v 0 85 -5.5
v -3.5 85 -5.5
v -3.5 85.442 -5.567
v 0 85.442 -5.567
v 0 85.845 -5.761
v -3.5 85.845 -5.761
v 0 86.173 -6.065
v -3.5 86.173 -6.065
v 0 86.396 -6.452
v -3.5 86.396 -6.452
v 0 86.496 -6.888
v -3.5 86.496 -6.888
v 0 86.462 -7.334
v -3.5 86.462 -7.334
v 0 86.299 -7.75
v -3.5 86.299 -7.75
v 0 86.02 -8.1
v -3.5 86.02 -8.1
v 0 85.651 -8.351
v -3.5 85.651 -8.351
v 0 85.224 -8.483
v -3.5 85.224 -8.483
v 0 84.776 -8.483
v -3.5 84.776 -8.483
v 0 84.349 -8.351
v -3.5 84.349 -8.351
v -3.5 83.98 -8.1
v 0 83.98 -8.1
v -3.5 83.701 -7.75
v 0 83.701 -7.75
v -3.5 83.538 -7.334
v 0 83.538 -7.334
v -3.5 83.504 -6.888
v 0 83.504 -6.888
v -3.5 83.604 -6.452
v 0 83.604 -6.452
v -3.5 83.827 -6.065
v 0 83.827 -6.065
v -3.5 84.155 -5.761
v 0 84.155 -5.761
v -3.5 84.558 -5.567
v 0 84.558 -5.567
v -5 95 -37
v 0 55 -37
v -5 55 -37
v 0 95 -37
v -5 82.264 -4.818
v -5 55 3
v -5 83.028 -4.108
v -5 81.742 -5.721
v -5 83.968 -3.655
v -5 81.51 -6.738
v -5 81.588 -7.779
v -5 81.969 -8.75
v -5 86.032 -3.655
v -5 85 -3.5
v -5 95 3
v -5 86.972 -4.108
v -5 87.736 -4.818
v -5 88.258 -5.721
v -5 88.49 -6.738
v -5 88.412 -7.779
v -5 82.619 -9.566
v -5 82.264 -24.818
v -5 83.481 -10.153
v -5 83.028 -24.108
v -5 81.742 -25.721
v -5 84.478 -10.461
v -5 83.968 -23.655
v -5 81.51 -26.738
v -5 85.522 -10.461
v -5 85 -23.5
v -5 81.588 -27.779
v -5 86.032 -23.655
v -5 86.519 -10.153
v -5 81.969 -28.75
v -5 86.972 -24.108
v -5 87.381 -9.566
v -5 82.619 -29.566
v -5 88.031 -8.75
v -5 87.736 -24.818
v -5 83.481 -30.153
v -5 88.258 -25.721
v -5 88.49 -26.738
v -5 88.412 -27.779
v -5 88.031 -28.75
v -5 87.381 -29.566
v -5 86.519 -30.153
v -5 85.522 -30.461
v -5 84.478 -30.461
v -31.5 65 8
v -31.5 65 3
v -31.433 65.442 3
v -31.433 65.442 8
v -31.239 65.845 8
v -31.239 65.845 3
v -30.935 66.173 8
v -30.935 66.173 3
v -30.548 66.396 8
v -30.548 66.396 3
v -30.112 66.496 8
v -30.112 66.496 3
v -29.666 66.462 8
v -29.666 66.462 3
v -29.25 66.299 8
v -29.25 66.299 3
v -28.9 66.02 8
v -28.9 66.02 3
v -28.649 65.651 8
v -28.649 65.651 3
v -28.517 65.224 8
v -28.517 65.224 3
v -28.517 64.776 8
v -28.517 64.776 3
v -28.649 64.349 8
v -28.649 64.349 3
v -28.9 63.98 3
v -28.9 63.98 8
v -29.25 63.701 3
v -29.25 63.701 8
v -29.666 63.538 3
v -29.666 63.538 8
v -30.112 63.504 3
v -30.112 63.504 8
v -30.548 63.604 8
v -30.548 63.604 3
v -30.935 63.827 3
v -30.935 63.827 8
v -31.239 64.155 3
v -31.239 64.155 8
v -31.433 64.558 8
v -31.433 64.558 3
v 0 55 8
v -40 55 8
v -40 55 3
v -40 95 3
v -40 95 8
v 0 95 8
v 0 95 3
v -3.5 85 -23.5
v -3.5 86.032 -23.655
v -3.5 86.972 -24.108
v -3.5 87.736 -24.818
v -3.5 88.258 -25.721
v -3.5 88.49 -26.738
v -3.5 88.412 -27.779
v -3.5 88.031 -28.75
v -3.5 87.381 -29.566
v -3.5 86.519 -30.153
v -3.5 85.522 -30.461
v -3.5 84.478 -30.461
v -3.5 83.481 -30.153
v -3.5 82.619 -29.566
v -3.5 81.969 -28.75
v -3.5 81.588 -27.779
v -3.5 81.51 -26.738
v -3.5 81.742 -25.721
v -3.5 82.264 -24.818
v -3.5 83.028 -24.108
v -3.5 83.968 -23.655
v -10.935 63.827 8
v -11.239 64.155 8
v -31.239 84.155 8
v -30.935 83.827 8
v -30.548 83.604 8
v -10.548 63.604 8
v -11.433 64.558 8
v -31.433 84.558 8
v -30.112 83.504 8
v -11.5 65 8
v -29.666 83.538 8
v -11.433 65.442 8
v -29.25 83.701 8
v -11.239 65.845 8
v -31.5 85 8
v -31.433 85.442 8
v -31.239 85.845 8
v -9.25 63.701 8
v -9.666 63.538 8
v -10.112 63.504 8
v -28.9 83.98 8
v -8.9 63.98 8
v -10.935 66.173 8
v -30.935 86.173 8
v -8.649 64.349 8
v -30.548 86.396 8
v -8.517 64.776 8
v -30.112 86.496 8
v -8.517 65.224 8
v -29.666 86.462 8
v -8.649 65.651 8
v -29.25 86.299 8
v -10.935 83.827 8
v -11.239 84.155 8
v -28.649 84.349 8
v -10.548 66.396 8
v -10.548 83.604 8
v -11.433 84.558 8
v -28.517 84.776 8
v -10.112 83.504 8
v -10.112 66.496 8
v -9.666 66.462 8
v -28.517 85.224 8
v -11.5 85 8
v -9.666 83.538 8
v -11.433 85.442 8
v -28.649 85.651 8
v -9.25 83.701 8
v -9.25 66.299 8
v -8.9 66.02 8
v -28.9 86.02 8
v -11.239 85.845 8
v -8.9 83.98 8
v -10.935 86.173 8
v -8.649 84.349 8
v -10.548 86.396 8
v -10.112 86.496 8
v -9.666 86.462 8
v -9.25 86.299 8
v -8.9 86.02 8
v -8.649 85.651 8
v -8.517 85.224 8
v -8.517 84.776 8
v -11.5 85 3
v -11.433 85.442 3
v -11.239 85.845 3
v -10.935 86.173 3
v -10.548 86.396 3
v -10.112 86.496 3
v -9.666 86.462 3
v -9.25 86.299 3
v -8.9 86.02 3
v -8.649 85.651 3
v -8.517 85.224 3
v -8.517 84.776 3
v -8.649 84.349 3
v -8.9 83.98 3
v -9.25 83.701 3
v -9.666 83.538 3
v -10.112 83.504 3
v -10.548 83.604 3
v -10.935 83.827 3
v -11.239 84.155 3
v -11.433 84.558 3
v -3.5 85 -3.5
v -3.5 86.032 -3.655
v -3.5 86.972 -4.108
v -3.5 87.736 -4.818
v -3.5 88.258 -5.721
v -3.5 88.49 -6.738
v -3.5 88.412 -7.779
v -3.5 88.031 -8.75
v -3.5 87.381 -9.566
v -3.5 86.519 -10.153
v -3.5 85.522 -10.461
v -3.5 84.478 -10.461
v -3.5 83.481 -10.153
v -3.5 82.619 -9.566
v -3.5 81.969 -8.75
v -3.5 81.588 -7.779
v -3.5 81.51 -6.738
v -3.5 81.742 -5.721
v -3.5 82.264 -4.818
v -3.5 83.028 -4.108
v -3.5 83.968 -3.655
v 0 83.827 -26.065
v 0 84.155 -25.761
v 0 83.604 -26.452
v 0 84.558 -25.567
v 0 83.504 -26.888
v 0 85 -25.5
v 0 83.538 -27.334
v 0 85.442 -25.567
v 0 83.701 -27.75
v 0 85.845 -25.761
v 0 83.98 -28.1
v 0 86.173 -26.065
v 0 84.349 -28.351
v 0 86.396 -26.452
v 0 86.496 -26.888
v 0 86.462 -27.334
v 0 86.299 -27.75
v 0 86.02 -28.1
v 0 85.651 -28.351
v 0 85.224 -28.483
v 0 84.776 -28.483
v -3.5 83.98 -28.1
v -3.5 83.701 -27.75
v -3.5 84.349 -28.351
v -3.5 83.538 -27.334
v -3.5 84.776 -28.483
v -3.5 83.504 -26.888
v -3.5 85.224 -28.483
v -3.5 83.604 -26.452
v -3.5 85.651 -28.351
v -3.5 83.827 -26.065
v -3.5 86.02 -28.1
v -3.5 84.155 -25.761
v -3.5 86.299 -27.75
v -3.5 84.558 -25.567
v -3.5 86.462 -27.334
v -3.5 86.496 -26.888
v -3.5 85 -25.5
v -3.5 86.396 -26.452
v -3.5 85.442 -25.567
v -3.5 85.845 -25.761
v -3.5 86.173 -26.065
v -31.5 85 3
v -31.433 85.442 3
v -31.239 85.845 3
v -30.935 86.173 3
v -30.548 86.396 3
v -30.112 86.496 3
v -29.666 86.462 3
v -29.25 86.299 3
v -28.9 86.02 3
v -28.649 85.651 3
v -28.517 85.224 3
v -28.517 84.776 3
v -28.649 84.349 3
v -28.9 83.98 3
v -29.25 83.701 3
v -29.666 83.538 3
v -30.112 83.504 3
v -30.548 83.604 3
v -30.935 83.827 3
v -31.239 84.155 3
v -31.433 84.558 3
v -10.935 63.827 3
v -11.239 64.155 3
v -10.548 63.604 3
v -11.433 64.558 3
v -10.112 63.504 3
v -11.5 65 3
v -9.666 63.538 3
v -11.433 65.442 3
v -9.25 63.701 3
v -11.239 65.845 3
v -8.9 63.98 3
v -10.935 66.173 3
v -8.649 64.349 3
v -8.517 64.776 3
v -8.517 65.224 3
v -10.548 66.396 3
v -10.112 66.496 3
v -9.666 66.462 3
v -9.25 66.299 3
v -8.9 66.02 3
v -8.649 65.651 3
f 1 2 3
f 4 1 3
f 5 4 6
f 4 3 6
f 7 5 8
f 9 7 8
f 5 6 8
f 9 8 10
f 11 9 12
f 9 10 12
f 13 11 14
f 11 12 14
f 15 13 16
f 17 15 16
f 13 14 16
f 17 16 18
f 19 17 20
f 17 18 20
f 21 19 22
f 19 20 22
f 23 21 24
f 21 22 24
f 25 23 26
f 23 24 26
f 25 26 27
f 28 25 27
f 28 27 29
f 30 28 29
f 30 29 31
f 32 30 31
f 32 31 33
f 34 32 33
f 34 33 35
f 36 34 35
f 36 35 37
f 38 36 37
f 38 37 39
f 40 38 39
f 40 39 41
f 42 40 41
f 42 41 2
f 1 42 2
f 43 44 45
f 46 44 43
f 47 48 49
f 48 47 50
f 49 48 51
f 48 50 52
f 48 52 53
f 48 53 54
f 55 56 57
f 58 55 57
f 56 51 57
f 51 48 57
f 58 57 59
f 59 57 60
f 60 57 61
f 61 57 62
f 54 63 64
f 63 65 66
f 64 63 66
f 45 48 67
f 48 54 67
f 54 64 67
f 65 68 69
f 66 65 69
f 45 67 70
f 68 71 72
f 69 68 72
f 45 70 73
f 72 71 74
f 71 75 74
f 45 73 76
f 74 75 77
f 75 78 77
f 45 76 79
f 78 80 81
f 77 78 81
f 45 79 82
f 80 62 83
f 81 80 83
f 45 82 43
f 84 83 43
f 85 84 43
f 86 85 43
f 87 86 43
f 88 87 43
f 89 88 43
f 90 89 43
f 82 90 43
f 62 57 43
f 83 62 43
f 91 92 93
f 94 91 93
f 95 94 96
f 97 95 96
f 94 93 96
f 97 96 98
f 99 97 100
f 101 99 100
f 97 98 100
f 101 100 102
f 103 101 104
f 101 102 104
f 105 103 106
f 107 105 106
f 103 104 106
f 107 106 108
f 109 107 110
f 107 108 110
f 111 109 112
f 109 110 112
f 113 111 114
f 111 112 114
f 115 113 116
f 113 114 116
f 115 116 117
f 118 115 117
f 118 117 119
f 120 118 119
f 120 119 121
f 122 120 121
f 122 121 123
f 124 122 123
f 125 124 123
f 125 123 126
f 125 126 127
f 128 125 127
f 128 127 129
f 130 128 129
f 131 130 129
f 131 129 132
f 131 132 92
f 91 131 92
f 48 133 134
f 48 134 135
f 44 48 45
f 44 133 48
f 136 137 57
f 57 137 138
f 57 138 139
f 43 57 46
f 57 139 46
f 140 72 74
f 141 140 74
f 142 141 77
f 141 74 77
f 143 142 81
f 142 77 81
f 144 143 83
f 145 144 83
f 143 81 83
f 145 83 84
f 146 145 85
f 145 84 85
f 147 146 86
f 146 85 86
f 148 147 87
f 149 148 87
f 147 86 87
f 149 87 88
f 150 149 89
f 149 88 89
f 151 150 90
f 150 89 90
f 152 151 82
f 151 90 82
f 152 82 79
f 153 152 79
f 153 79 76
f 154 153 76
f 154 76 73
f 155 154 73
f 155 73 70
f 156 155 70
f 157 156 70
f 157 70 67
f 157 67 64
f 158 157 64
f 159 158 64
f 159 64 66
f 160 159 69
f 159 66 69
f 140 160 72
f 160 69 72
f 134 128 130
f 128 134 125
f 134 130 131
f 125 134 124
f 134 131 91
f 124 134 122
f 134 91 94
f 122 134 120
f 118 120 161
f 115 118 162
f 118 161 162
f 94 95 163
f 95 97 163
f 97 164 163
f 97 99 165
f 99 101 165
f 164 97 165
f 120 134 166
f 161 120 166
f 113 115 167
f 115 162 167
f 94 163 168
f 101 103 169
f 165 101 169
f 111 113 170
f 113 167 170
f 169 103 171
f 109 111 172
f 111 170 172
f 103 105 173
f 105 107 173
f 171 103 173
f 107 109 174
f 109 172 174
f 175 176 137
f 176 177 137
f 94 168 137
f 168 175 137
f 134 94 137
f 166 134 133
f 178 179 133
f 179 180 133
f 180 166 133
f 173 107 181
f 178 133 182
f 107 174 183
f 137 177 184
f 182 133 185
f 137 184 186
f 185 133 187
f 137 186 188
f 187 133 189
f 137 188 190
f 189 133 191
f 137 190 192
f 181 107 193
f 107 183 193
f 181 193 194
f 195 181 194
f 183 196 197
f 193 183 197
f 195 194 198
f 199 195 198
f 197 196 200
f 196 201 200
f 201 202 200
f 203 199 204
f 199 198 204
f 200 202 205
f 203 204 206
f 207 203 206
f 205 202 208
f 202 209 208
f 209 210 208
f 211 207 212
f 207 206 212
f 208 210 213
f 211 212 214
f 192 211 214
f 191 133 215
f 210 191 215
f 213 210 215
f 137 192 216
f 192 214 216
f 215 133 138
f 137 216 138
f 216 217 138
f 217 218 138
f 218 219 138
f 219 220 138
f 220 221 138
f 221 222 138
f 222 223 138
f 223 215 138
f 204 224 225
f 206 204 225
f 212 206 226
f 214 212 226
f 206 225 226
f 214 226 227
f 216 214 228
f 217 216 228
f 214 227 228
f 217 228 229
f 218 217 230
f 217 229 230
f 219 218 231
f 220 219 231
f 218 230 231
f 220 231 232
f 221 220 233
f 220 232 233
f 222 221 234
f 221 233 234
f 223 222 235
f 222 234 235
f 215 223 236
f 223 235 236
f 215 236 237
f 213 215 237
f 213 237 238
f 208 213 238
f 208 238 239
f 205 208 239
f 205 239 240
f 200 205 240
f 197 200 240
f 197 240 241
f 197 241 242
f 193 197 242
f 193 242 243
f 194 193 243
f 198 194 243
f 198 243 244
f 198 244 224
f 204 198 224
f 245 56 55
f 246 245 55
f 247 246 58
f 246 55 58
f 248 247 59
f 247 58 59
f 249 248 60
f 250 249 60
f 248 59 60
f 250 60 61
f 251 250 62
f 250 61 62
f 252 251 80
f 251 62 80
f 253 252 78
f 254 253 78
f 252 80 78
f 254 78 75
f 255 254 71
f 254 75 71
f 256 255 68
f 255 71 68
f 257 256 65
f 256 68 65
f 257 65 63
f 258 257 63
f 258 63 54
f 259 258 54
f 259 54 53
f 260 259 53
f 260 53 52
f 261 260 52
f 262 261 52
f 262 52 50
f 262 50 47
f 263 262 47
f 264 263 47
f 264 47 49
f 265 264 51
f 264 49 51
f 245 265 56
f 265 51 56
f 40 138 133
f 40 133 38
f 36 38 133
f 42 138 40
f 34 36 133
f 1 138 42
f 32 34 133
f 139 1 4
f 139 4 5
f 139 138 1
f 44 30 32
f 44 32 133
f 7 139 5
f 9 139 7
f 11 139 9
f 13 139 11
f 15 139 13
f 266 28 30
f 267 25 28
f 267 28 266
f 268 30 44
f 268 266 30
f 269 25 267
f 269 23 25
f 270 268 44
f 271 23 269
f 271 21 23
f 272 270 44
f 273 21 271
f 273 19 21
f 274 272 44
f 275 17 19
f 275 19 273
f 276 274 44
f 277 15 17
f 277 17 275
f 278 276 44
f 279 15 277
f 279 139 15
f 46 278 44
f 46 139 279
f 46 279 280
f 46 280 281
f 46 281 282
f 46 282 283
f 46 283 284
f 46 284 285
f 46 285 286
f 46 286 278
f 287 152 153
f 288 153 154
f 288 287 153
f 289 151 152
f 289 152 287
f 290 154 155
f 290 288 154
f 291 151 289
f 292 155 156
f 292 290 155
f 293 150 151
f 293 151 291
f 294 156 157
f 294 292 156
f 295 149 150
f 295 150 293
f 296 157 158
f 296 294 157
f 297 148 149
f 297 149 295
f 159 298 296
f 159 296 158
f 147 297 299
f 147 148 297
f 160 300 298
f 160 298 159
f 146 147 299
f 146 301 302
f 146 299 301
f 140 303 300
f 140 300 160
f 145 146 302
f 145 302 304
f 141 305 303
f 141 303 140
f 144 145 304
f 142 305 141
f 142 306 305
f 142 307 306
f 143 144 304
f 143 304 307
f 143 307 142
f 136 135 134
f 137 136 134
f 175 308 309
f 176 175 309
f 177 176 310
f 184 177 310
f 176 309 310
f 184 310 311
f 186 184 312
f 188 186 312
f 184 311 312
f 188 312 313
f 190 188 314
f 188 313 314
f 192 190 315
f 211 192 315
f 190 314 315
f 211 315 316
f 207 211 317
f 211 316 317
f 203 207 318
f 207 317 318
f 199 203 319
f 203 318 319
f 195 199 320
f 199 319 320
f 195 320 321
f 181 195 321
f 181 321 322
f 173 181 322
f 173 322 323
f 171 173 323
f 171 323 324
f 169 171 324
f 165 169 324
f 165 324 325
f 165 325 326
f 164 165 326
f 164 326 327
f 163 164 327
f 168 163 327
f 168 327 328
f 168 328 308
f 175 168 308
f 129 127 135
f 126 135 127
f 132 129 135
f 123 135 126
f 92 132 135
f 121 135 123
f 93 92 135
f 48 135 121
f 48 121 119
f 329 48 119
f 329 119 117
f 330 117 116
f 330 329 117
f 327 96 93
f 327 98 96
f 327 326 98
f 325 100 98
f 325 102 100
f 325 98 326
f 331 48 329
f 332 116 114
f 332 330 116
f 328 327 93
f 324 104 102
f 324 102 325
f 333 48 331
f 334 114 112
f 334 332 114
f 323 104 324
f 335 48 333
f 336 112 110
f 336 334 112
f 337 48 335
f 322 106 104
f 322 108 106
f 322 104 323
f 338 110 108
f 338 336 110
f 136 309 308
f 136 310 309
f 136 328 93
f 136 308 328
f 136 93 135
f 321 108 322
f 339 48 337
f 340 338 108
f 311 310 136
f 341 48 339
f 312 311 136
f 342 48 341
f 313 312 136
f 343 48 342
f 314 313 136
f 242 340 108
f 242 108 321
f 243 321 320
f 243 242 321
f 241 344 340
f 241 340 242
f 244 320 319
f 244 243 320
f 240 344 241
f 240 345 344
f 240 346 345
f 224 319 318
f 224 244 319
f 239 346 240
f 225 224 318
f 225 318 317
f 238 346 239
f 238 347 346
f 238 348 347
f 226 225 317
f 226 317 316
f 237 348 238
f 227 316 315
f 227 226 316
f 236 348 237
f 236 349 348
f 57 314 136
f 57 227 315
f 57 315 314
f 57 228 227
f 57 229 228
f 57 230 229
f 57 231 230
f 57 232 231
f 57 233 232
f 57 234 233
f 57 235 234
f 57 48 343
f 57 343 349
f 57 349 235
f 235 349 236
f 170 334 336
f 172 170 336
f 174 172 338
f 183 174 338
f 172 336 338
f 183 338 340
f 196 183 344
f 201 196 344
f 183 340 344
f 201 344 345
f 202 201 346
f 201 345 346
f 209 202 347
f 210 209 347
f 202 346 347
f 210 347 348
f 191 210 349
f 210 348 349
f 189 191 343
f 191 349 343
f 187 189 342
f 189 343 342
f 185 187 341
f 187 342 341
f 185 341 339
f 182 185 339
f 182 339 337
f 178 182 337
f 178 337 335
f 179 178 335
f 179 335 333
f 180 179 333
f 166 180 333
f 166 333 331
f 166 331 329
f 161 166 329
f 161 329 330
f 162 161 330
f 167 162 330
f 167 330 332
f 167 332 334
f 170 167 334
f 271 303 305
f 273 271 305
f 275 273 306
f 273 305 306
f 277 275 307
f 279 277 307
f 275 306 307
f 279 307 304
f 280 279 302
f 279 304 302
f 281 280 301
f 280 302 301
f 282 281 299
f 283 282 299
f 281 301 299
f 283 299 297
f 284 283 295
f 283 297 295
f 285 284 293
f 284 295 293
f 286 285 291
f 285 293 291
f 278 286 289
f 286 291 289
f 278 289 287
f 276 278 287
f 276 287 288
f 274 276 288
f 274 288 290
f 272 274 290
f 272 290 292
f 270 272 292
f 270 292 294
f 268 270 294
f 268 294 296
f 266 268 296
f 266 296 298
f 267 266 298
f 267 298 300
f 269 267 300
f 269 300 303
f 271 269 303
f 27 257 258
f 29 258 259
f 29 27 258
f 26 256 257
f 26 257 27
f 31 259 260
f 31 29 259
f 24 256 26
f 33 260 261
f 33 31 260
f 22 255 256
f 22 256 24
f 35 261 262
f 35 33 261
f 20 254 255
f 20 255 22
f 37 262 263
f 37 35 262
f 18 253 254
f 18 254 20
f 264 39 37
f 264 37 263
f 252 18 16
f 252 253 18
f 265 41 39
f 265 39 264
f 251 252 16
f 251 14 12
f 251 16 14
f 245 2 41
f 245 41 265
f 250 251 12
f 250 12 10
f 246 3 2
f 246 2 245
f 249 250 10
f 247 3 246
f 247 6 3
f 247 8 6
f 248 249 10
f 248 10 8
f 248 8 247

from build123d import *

# Parameters (mm, degrees)
BOSS_EXTRUDE1_DEPTH  = 597.1
SKETCH2_W            = 65.2
SKETCH2_H            = 400
CUT_EXTRUDE1_DEPTH   = 800.095369778
BOSS_EXTRUDE2_DEPTH  = 8
SKETCH4_W            = 525
SKETCH4_H            = 597.1
BOSS_EXTRUDE3_DEPTH  = 7
SKETCH5_W            = 365
SKETCH5_H            = 597.1
CUT_EXTRUDE2_DEPTH   = 10
CUT_EXTRUDE3_REACH   = 802.736
SKETCH6_R            = 2.125
SKETCH7_W            = 20
SKETCH7_H            = 597.1
CUT_EXTRUDE4_DEPTH   = 5
SKETCH8_W            = 55.055493435
SKETCH8_H            = 20
CUT_EXTRUDE6_DEPTH   = 60
BOSS_EXTRUDE4_REACH  = 799.121
SKETCH13_W           = 40
SKETCH13_H           = 15
SKETCH14_W           = 20
SKETCH14_H           = 597.1
CUT_EXTRUDE7_DEPTH   = 5
CUT_EXTRUDE8_REACH   = 802.736
SKETCH15_R           = 1.33
SKETCH16_W           = 35
SKETCH16_H           = 15
CUT_EXTRUDE9_DEPTH   = 60
SKETCH17_W           = 60
SKETCH17_H           = 150
CUT_EXTRUDE10_DEPTH  = 40
SKETCH18_W           = 12
SKETCH18_H           = 16
CUT_EXTRUDE11_DEPTH  = 800.298073312
SKETCH19_W           = 8
SKETCH19_H           = 7
CUT_EXTRUDE12_DEPTH  = 10
CUT_EXTRUDE13_REACH  = 802.736
SKETCH20_R           = 2.75986214
SKETCH20_R_2         = 2.757960919
SKETCH20_R_3         = 2.776094021
SKETCH20_R_4         = 2.751394876
CUT_EXTRUDE14_REACH  = 802.736
SKETCH21_R           = 1.643359813
SKETCH21_R_2         = 1.638913006
SKETCH21_R_3         = 1.644479807
SKETCH21_R_4         = 1.70596398
SKETCH21_R_5         = 1.645380558
SKETCH21_R_6         = 1.646601879
SKETCH21_R_7         = 1.661334202
SKETCH21_R_8         = 1.701244733
CUT_EXTRUDE15_REACH  = 752.719
SKETCH22_W           = 15
SKETCH22_H           = 20
CUT_EXTRUDE16_REACH  = 802.736
SKETCH24_R           = 1.5
SKETCH27_W           = 35
SKETCH27_H           = 15
CUT_EXTRUDE17_DEPTH  = 60
CUT_EXTRUDE18_START  = -60
SKETCH28_W           = 35
SKETCH28_H           = 15
SKETCH28_R           = 1.5
CUT_EXTRUDE18_DEPTH  = 60
SKETCH29_W           = 60
SKETCH29_H           = 150
CUT_EXTRUDE19_DEPTH  = 40
CUT_EXTRUDE20_REACH  = 802.736
SKETCH33_R           = 2.5
SKETCH37_W           = 55
SKETCH37_H           = 20
CUT_EXTRUDE21_DEPTH  = 60
SKETCH39_W           = 5
SKETCH39_H           = 40
BOSS_EXTRUDE6_DEPTH  = 40
SKETCH41_R           = 1.5
CUT_EXTRUDE22_DEPTH  = 799.501603004
SKETCH42_W           = 35
SKETCH42_H           = 15
BOSS_EXTRUDE7_DEPTH  = 60
SKETCH43_W           = 41.147889502
SKETCH43_H           = 41.618954825
SKETCH43_W_2         = 42.4363484
SKETCH43_H_2         = 40
BOSS_EXTRUDE8_DEPTH  = 20
SKETCH44_W           = 49.636924656
SKETCH44_H           = 46.225017069
SKETCH44_W_2         = 46.873520021
BOSS_EXTRUDE9_DEPTH  = 20
SKETCH45_W           = 35
SKETCH45_H           = 15
BOSS_EXTRUDE10_DEPTH = 60
SKETCH46_W           = 5
SKETCH46_H           = 40
BOSS_EXTRUDE11_DEPTH = 40
SKETCH47_R           = 1.5
CUT_EXTRUDE23_DEPTH  = 826.351325194
FILLET1_R            = 5
FILLET2_R            = 5
SKETCH51_W           = 40
SKETCH51_H           = 40
BOSS_EXTRUDE12_DEPTH = 5
SKETCH52_R           = 3
CUT_EXTRUDE26_DEPTH  = 831.93526222
SKETCH53_R           = 3.280439698
BOSS_EXTRUDE13_DEPTH = 570
CUT_EXTRUDE27_START  = -40
SKETCH54_R           = 3.280439698
CUT_EXTRUDE27_DEPTH  = 40
SKETCH55_W           = 485
SKETCH55_H           = 14.478767201
CUT_EXTRUDE28_DEPTH  = 40
SKETCH57_W           = 723.186896727
SKETCH57_H           = 160.707941424
CUT_EXTRUDE30_DEPTH  = 828.51338962
SKETCH60_W           = 40
SKETCH60_H           = 40
BOSS_EXTRUDE15_DEPTH = 5
SKETCH61_R           = 3
CUT_EXTRUDE31_DEPTH  = 5
SKETCH62_W           = 40
SKETCH62_H           = 40
CUT_EXTRUDE32_DEPTH  = 5
SKETCH63_R           = 4.70093443
SKETCH63_R_2         = 1.5
SKETCH63_R_3         = 5.7398541
BOSS_EXTRUDE16_DEPTH = 5
SKETCH64_R           = 3.5
CUT_EXTRUDE33_DEPTH  = 1.5


with BuildPart() as part:
    # Sketch1 → Boss-Extrude1 (new body)
    with BuildSketch(Plane.XY):
        Polygon((0, 95), (0, 0), (237.916666667, 0), (262.5, 0), (262.5, 15), (80, 15), (80, 80), (70, 80), (70, 75), (50, 75), (50, 80), (40, 80), (40, 75), (20, 75), (20, 95), align=None)
        Polygon((262.5, 15), (262.5, 0), (287.083333333, 0), (525, 0), (525, 95), (505, 95), (505, 75), (485, 75), (485, 80), (475, 80), (475, 75), (455, 75), (455, 80), (445, 80), (445, 15), align=None)
    extrude(amount=BOSS_EXTRUDE1_DEPTH)

    # Sketch2 → Cut-Extrude1 (cut, through all)
    with BuildSketch(Plane(origin=(0, 15, 0), x_dir=(1, 0, 0), z_dir=(0, 1, 0))):
        with Locations((219.9, -200)):
            Rectangle(SKETCH2_W, SKETCH2_H)
        with Locations((305.1, -397.1)):
            Rectangle(SKETCH2_W, SKETCH2_H)
    extrude(amount=-CUT_EXTRUDE1_DEPTH, mode=Mode.SUBTRACT)

    # Sketch3 → Boss-Extrude2 (add)
    with BuildSketch(Plane(origin=(0, 15, 0), x_dir=(1, 0, 0), z_dir=(0, 1, 0))):
        Polygon((252.5, -400), (187.3, -400), (187.3, 0), (80, 0), (80, -597.1), (272.5, -597.1), (272.5, -197.1), (337.7, -197.1), (337.7, -597.1), (445, -597.1), (445, 0), (252.5, 0), align=None)
    extrude(amount=BOSS_EXTRUDE2_DEPTH)

    # Sketch4 → Boss-Extrude3 (add)
    with BuildSketch(Plane.XZ):
        with Locations((262.5, 298.55)):
            Rectangle(SKETCH4_W, SKETCH4_H)
    extrude(amount=BOSS_EXTRUDE3_DEPTH)

    # Sketch5 → Cut-Extrude2 (cut)
    with BuildSketch(Plane(origin=(0, 23, 0), x_dir=(1, 0, 0), z_dir=(0, 1, 0))):
        with Locations((262.5, -298.55)):
            Rectangle(SKETCH5_W, SKETCH5_H)
    extrude(amount=-CUT_EXTRUDE2_DEPTH, mode=Mode.SUBTRACT)

    # Sketch6 → Cut-Extrude3 (cut, up to next)
    with BuildSketch(Plane(origin=(525, 0, 0), x_dir=(0, 0, -1), z_dir=(1, 0, 0)), mode=Mode.PRIVATE) as cut_extrude3_sk1:
        with Locations((-318.55, 79)):
            Circle(SKETCH6_R)
    cut_extrude3_tool1 = extrude(cut_extrude3_sk1.sketch, amount=-CUT_EXTRUDE3_REACH, mode=Mode.PRIVATE) & part.part
    # Sketch6 → Cut-Extrude3 (cut, up to next)
    with BuildSketch(Plane(origin=(525, 0, 0), x_dir=(0, 0, -1), z_dir=(1, 0, 0)), mode=Mode.PRIVATE) as cut_extrude3_sk2:
        with Locations((-318.55, 63)):
            Circle(SKETCH6_R)
    cut_extrude3_tool2 = extrude(cut_extrude3_sk2.sketch, amount=-CUT_EXTRUDE3_REACH, mode=Mode.PRIVATE) & part.part
    # Sketch6 → Cut-Extrude3 (cut, up to next)
    with BuildSketch(Plane(origin=(525, 0, 0), x_dir=(0, 0, -1), z_dir=(1, 0, 0)), mode=Mode.PRIVATE) as cut_extrude3_sk3:
        with Locations((-278.55, 63)):
            Circle(SKETCH6_R)
    cut_extrude3_tool3 = extrude(cut_extrude3_sk3.sketch, amount=-CUT_EXTRUDE3_REACH, mode=Mode.PRIVATE) & part.part
    # Sketch6 → Cut-Extrude3 (cut, up to next)
    with BuildSketch(Plane(origin=(525, 0, 0), x_dir=(0, 0, -1), z_dir=(1, 0, 0)), mode=Mode.PRIVATE) as cut_extrude3_sk4:
        with Locations((-278.55, 79)):
            Circle(SKETCH6_R)
    cut_extrude3_tool4 = extrude(cut_extrude3_sk4.sketch, amount=-CUT_EXTRUDE3_REACH, mode=Mode.PRIVATE) & part.part
    add(cut_extrude3_tool1.solids().sort_by_distance((525, 79, 318.55))[0], mode=Mode.SUBTRACT)
    add(cut_extrude3_tool2.solids().sort_by_distance((525, 63, 318.55))[0], mode=Mode.SUBTRACT)
    add(cut_extrude3_tool3.solids().sort_by_distance((525, 63, 278.55))[0], mode=Mode.SUBTRACT)
    add(cut_extrude3_tool4.solids().sort_by_distance((525, 79, 278.55))[0], mode=Mode.SUBTRACT)

    # Sketch7 → Cut-Extrude4 (cut)
    with BuildSketch(Plane(origin=(0, 75, 0), x_dir=(1, 0, 0), z_dir=(0, 1, 0))):
        with Locations((495, -298.55)):
            Rectangle(SKETCH7_W, SKETCH7_H)
    extrude(amount=-CUT_EXTRUDE4_DEPTH, mode=Mode.SUBTRACT)

    # Sketch8 → Cut-Extrude6 (cut)
    with BuildSketch(Plane.ZY.offset(-445)):
        with Locations((297.395302375, 60)):
            Rectangle(SKETCH8_W, SKETCH8_H)
    extrude(amount=-CUT_EXTRUDE6_DEPTH, mode=Mode.SUBTRACT)

    # Sketch13 → Boss-Extrude4 (add, up to next)
    with BuildSketch(Plane(origin=(0, 50, 0), x_dir=(1, 0, 0), z_dir=(0, 1, 0)), mode=Mode.PRIVATE) as boss_extrude4_sk1:
        with Locations((465, -297.800707188)):
            Rectangle(SKETCH13_W, SKETCH13_H)
    boss_extrude4_tool1 = extrude(boss_extrude4_sk1.sketch, amount=BOSS_EXTRUDE4_REACH, mode=Mode.PRIVATE) - part.part
    add(boss_extrude4_tool1.solids().sort_by_distance((465, 50, 297.800707))[0])

    # Sketch14 → Cut-Extrude7 (cut)
    with BuildSketch(Plane(origin=(0, 75, 0), x_dir=(1, 0, 0), z_dir=(0, 1, 0))):
        with Locations((30, -298.55)):
            Rectangle(SKETCH14_W, SKETCH14_H)
    extrude(amount=-CUT_EXTRUDE7_DEPTH, mode=Mode.SUBTRACT)

    # Sketch15 → Cut-Extrude8 (cut, up to next)
    with BuildSketch(Plane.ZY, mode=Mode.PRIVATE) as cut_extrude8_sk1:
        with Locations((13.5, 82.3)):
            Circle(SKETCH15_R)
    cut_extrude8_tool1 = extrude(cut_extrude8_sk1.sketch, amount=-CUT_EXTRUDE8_REACH, mode=Mode.PRIVATE) & part.part
    # Sketch15 → Cut-Extrude8 (cut, up to next)
    with BuildSketch(Plane.ZY, mode=Mode.PRIVATE) as cut_extrude8_sk2:
        with Locations((33.5, 82.3)):
            Circle(SKETCH15_R)
    cut_extrude8_tool2 = extrude(cut_extrude8_sk2.sketch, amount=-CUT_EXTRUDE8_REACH, mode=Mode.PRIVATE) & part.part
    # Sketch15 → Cut-Extrude8 (cut, up to next)
    with BuildSketch(Plane.ZY, mode=Mode.PRIVATE) as cut_extrude8_sk3:
        with Locations((13.5, 62.3)):
            Circle(SKETCH15_R)
    cut_extrude8_tool3 = extrude(cut_extrude8_sk3.sketch, amount=-CUT_EXTRUDE8_REACH, mode=Mode.PRIVATE) & part.part
    # Sketch15 → Cut-Extrude8 (cut, up to next)
    with BuildSketch(Plane.ZY, mode=Mode.PRIVATE) as cut_extrude8_sk4:
        with Locations((33.5, 62.3)):
            Circle(SKETCH15_R)
    cut_extrude8_tool4 = extrude(cut_extrude8_sk4.sketch, amount=-CUT_EXTRUDE8_REACH, mode=Mode.PRIVATE) & part.part
    # Sketch15 → Cut-Extrude8 (cut, up to next)
    with BuildSketch(Plane.ZY, mode=Mode.PRIVATE) as cut_extrude8_sk5:
        with Locations((563.6, 82.3)):
            Circle(SKETCH15_R)
    cut_extrude8_tool5 = extrude(cut_extrude8_sk5.sketch, amount=-CUT_EXTRUDE8_REACH, mode=Mode.PRIVATE) & part.part
    # Sketch15 → Cut-Extrude8 (cut, up to next)
    with BuildSketch(Plane.ZY, mode=Mode.PRIVATE) as cut_extrude8_sk6:
        with Locations((583.6, 62.3)):
            Circle(SKETCH15_R)
    cut_extrude8_tool6 = extrude(cut_extrude8_sk6.sketch, amount=-CUT_EXTRUDE8_REACH, mode=Mode.PRIVATE) & part.part
    # Sketch15 → Cut-Extrude8 (cut, up to next)
    with BuildSketch(Plane.ZY, mode=Mode.PRIVATE) as cut_extrude8_sk7:
        with Locations((563.6, 62.3)):
            Circle(SKETCH15_R)
    cut_extrude8_tool7 = extrude(cut_extrude8_sk7.sketch, amount=-CUT_EXTRUDE8_REACH, mode=Mode.PRIVATE) & part.part
    # Sketch15 → Cut-Extrude8 (cut, up to next)
    with BuildSketch(Plane.ZY, mode=Mode.PRIVATE) as cut_extrude8_sk8:
        with Locations(Location((583.6, 82.3, 0), (0, 0, 90))):
            Circle(SKETCH15_R)
    cut_extrude8_tool8 = extrude(cut_extrude8_sk8.sketch, amount=-CUT_EXTRUDE8_REACH, mode=Mode.PRIVATE) & part.part
    add(cut_extrude8_tool1.solids().sort_by_distance((0, 82.3, 13.5))[0], mode=Mode.SUBTRACT)
    add(cut_extrude8_tool2.solids().sort_by_distance((0, 82.3, 33.5))[0], mode=Mode.SUBTRACT)
    add(cut_extrude8_tool3.solids().sort_by_distance((0, 62.3, 13.5))[0], mode=Mode.SUBTRACT)
    add(cut_extrude8_tool4.solids().sort_by_distance((0, 62.3, 33.5))[0], mode=Mode.SUBTRACT)
    add(cut_extrude8_tool5.solids().sort_by_distance((0, 82.3, 563.6))[0], mode=Mode.SUBTRACT)
    add(cut_extrude8_tool6.solids().sort_by_distance((0, 62.3, 583.6))[0], mode=Mode.SUBTRACT)
    add(cut_extrude8_tool7.solids().sort_by_distance((0, 62.3, 563.6))[0], mode=Mode.SUBTRACT)
    add(cut_extrude8_tool8.solids().sort_by_distance((0, 82.3, 583.6))[0], mode=Mode.SUBTRACT)

    # Sketch16 → Cut-Extrude9 (cut)
    with BuildSketch(Plane(origin=(80, 0, 0), x_dir=(0, 0, -1), z_dir=(1, 0, 0))):
        with Locations((-574.6, 62.5)):
            Rectangle(SKETCH16_W, SKETCH16_H)
        with Locations((-22.5, 62.5)):
            Rectangle(SKETCH16_W, SKETCH16_H)
    extrude(amount=-CUT_EXTRUDE9_DEPTH, mode=Mode.SUBTRACT)

    # Sketch17 → Cut-Extrude10 (cut)
    with BuildSketch(Plane.XZ.offset(7)):
        with Locations((495, 298.55)):
            Rectangle(SKETCH17_W, SKETCH17_H)
    extrude(amount=-CUT_EXTRUDE10_DEPTH, mode=Mode.SUBTRACT)

    # Sketch18 → Cut-Extrude11 (cut, through all)
    with BuildSketch(Plane(origin=(0, 13, 0), x_dir=(1, 0, 0), z_dir=(0, 1, 0))):
        with Locations((421, -294.05)):
            Rectangle(SKETCH18_W, SKETCH18_H)
    extrude(amount=-CUT_EXTRUDE11_DEPTH, mode=Mode.SUBTRACT)

    # Sketch19 → Cut-Extrude12 (cut)
    with BuildSketch(Plane(origin=(0, 13, 0), x_dir=(1, 0, 0), z_dir=(0, 1, 0))):
        with Locations((421, -282.55)):
            Rectangle(SKETCH19_W, SKETCH19_H)
        with Locations((421, -305.55)):
            Rectangle(SKETCH19_W, SKETCH19_H)
    extrude(amount=-CUT_EXTRUDE12_DEPTH, mode=Mode.SUBTRACT)

    # Sketch20 → Cut-Extrude13 (cut, up to next)
    with BuildSketch(Plane(origin=(525, 0, 0), x_dir=(0, 0, -1), z_dir=(1, 0, 0)), mode=Mode.PRIVATE) as cut_extrude13_sk1:
        with Locations((-318.55, 79)):
            Circle(SKETCH20_R)
    cut_extrude13_tool1 = extrude(cut_extrude13_sk1.sketch, amount=-CUT_EXTRUDE13_REACH, mode=Mode.PRIVATE) & part.part
    # Sketch20 → Cut-Extrude13 (cut, up to next)
    with BuildSketch(Plane(origin=(525, 0, 0), x_dir=(0, 0, -1), z_dir=(1, 0, 0)), mode=Mode.PRIVATE) as cut_extrude13_sk2:
        with Locations((-318.55, 63)):
            Circle(SKETCH20_R_2)
    cut_extrude13_tool2 = extrude(cut_extrude13_sk2.sketch, amount=-CUT_EXTRUDE13_REACH, mode=Mode.PRIVATE) & part.part
    # Sketch20 → Cut-Extrude13 (cut, up to next)
    with BuildSketch(Plane(origin=(525, 0, 0), x_dir=(0, 0, -1), z_dir=(1, 0, 0)), mode=Mode.PRIVATE) as cut_extrude13_sk3:
        with Locations((-278.55, 63)):
            Circle(SKETCH20_R_3)
    cut_extrude13_tool3 = extrude(cut_extrude13_sk3.sketch, amount=-CUT_EXTRUDE13_REACH, mode=Mode.PRIVATE) & part.part
    # Sketch20 → Cut-Extrude13 (cut, up to next)
    with BuildSketch(Plane(origin=(525, 0, 0), x_dir=(0, 0, -1), z_dir=(1, 0, 0)), mode=Mode.PRIVATE) as cut_extrude13_sk4:
        with Locations((-278.55, 79)):
            Circle(SKETCH20_R_4)
    cut_extrude13_tool4 = extrude(cut_extrude13_sk4.sketch, amount=-CUT_EXTRUDE13_REACH, mode=Mode.PRIVATE) & part.part
    add(cut_extrude13_tool1.solids().sort_by_distance((525, 79, 318.55))[0], mode=Mode.SUBTRACT)
    add(cut_extrude13_tool2.solids().sort_by_distance((525, 63, 318.55))[0], mode=Mode.SUBTRACT)
    add(cut_extrude13_tool3.solids().sort_by_distance((525, 63, 278.55))[0], mode=Mode.SUBTRACT)
    add(cut_extrude13_tool4.solids().sort_by_distance((525, 79, 278.55))[0], mode=Mode.SUBTRACT)

    # Sketch21 → Cut-Extrude14 (cut, up to next)
    with BuildSketch(Plane.ZY, mode=Mode.PRIVATE) as cut_extrude14_sk1:
        with Locations((13.5, 82.3)):
            Circle(SKETCH21_R)
    cut_extrude14_tool1 = extrude(cut_extrude14_sk1.sketch, amount=-CUT_EXTRUDE14_REACH, mode=Mode.PRIVATE) & part.part
    # Sketch21 → Cut-Extrude14 (cut, up to next)
    with BuildSketch(Plane.ZY, mode=Mode.PRIVATE) as cut_extrude14_sk2:
        with Locations((13.5, 62.3)):
            Circle(SKETCH21_R_2)
    cut_extrude14_tool2 = extrude(cut_extrude14_sk2.sketch, amount=-CUT_EXTRUDE14_REACH, mode=Mode.PRIVATE) & part.part
    # Sketch21 → Cut-Extrude14 (cut, up to next)
    with BuildSketch(Plane.ZY, mode=Mode.PRIVATE) as cut_extrude14_sk3:
        with Locations((33.5, 62.3)):
            Circle(SKETCH21_R_3)
    cut_extrude14_tool3 = extrude(cut_extrude14_sk3.sketch, amount=-CUT_EXTRUDE14_REACH, mode=Mode.PRIVATE) & part.part
    # Sketch21 → Cut-Extrude14 (cut, up to next)
    with BuildSketch(Plane.ZY, mode=Mode.PRIVATE) as cut_extrude14_sk4:
        with Locations((33.5, 82.3)):
            Circle(SKETCH21_R_4)
    cut_extrude14_tool4 = extrude(cut_extrude14_sk4.sketch, amount=-CUT_EXTRUDE14_REACH, mode=Mode.PRIVATE) & part.part
    # Sketch21 → Cut-Extrude14 (cut, up to next)
    with BuildSketch(Plane.ZY, mode=Mode.PRIVATE) as cut_extrude14_sk5:
        with Locations((563.6, 62.3)):
            Circle(SKETCH21_R_5)
    cut_extrude14_tool5 = extrude(cut_extrude14_sk5.sketch, amount=-CUT_EXTRUDE14_REACH, mode=Mode.PRIVATE) & part.part
    # Sketch21 → Cut-Extrude14 (cut, up to next)
    with BuildSketch(Plane.ZY, mode=Mode.PRIVATE) as cut_extrude14_sk6:
        with Locations((583.6, 62.3)):
            Circle(SKETCH21_R_6)
    cut_extrude14_tool6 = extrude(cut_extrude14_sk6.sketch, amount=-CUT_EXTRUDE14_REACH, mode=Mode.PRIVATE) & part.part
    # Sketch21 → Cut-Extrude14 (cut, up to next)
    with BuildSketch(Plane.ZY, mode=Mode.PRIVATE) as cut_extrude14_sk7:
        with Locations((583.6, 82.3)):
            Circle(SKETCH21_R_7)
    cut_extrude14_tool7 = extrude(cut_extrude14_sk7.sketch, amount=-CUT_EXTRUDE14_REACH, mode=Mode.PRIVATE) & part.part
    # Sketch21 → Cut-Extrude14 (cut, up to next)
    with BuildSketch(Plane.ZY, mode=Mode.PRIVATE) as cut_extrude14_sk8:
        with Locations((563.6, 82.3)):
            Circle(SKETCH21_R_8)
    cut_extrude14_tool8 = extrude(cut_extrude14_sk8.sketch, amount=-CUT_EXTRUDE14_REACH, mode=Mode.PRIVATE) & part.part
    add(cut_extrude14_tool1.solids().sort_by_distance((0, 82.3, 13.5))[0], mode=Mode.SUBTRACT)
    add(cut_extrude14_tool2.solids().sort_by_distance((0, 62.3, 13.5))[0], mode=Mode.SUBTRACT)
    add(cut_extrude14_tool3.solids().sort_by_distance((0, 62.3, 33.5))[0], mode=Mode.SUBTRACT)
    add(cut_extrude14_tool4.solids().sort_by_distance((0, 82.3, 33.5))[0], mode=Mode.SUBTRACT)
    add(cut_extrude14_tool5.solids().sort_by_distance((0, 62.3, 563.6))[0], mode=Mode.SUBTRACT)
    add(cut_extrude14_tool6.solids().sort_by_distance((0, 62.3, 583.6))[0], mode=Mode.SUBTRACT)
    add(cut_extrude14_tool7.solids().sort_by_distance((0, 82.3, 583.6))[0], mode=Mode.SUBTRACT)
    add(cut_extrude14_tool8.solids().sort_by_distance((0, 82.3, 563.6))[0], mode=Mode.SUBTRACT)

    # Sketch22 → Cut-Extrude15 (cut, up to next)
    with BuildSketch(Plane.ZY.offset(-445), mode=Mode.PRIVATE) as cut_extrude15_sk1:
        with Locations((297.800707188, 60)):
            Rectangle(SKETCH22_W, SKETCH22_H)
    cut_extrude15_tool1 = extrude(cut_extrude15_sk1.sketch, amount=-CUT_EXTRUDE15_REACH, mode=Mode.PRIVATE) & part.part
    add(cut_extrude15_tool1.solids().sort_by_distance((445, 60, 297.800707))[0], mode=Mode.SUBTRACT)

    # Sketch24 → Cut-Extrude16 (cut, up to next)
    with BuildSketch(Plane(origin=(525, 0, 0), x_dir=(0, 0, -1), z_dir=(1, 0, 0)), mode=Mode.PRIVATE) as cut_extrude16_sk1:
        with Locations((-583.6, 82.3)):
            Circle(SKETCH24_R)
    cut_extrude16_tool1 = extrude(cut_extrude16_sk1.sketch, amount=-CUT_EXTRUDE16_REACH, mode=Mode.PRIVATE) & part.part
    # Sketch24 → Cut-Extrude16 (cut, up to next)
    with BuildSketch(Plane(origin=(525, 0, 0), x_dir=(0, 0, -1), z_dir=(1, 0, 0)), mode=Mode.PRIVATE) as cut_extrude16_sk2:
        with Locations((-563.6, 82.3)):
            Circle(SKETCH24_R)
    cut_extrude16_tool2 = extrude(cut_extrude16_sk2.sketch, amount=-CUT_EXTRUDE16_REACH, mode=Mode.PRIVATE) & part.part
    # Sketch24 → Cut-Extrude16 (cut, up to next)
    with BuildSketch(Plane(origin=(525, 0, 0), x_dir=(0, 0, -1), z_dir=(1, 0, 0)), mode=Mode.PRIVATE) as cut_extrude16_sk3:
        with Locations((-583.6, 62.3)):
            Circle(SKETCH24_R)
    cut_extrude16_tool3 = extrude(cut_extrude16_sk3.sketch, amount=-CUT_EXTRUDE16_REACH, mode=Mode.PRIVATE) & part.part
    # Sketch24 → Cut-Extrude16 (cut, up to next)
    with BuildSketch(Plane(origin=(525, 0, 0), x_dir=(0, 0, -1), z_dir=(1, 0, 0)), mode=Mode.PRIVATE) as cut_extrude16_sk4:
        with Locations((-563.6, 62.3)):
            Circle(SKETCH24_R)
    cut_extrude16_tool4 = extrude(cut_extrude16_sk4.sketch, amount=-CUT_EXTRUDE16_REACH, mode=Mode.PRIVATE) & part.part
    # Sketch24 → Cut-Extrude16 (cut, up to next)
    with BuildSketch(Plane(origin=(525, 0, 0), x_dir=(0, 0, -1), z_dir=(1, 0, 0)), mode=Mode.PRIVATE) as cut_extrude16_sk5:
        with Locations((-33.5, 82.3)):
            Circle(SKETCH24_R)
    cut_extrude16_tool5 = extrude(cut_extrude16_sk5.sketch, amount=-CUT_EXTRUDE16_REACH, mode=Mode.PRIVATE) & part.part
    # Sketch24 → Cut-Extrude16 (cut, up to next)
    with BuildSketch(Plane(origin=(525, 0, 0), x_dir=(0, 0, -1), z_dir=(1, 0, 0)), mode=Mode.PRIVATE) as cut_extrude16_sk6:
        with Locations((-13.5, 82.3)):
            Circle(SKETCH24_R)
    cut_extrude16_tool6 = extrude(cut_extrude16_sk6.sketch, amount=-CUT_EXTRUDE16_REACH, mode=Mode.PRIVATE) & part.part
    # Sketch24 → Cut-Extrude16 (cut, up to next)
    with BuildSketch(Plane(origin=(525, 0, 0), x_dir=(0, 0, -1), z_dir=(1, 0, 0)), mode=Mode.PRIVATE) as cut_extrude16_sk7:
        with Locations((-13.5, 62.3)):
            Circle(SKETCH24_R)
    cut_extrude16_tool7 = extrude(cut_extrude16_sk7.sketch, amount=-CUT_EXTRUDE16_REACH, mode=Mode.PRIVATE) & part.part
    # Sketch24 → Cut-Extrude16 (cut, up to next)
    with BuildSketch(Plane(origin=(525, 0, 0), x_dir=(0, 0, -1), z_dir=(1, 0, 0)), mode=Mode.PRIVATE) as cut_extrude16_sk8:
        with Locations((-33.5, 62.3)):
            Circle(SKETCH24_R)
    cut_extrude16_tool8 = extrude(cut_extrude16_sk8.sketch, amount=-CUT_EXTRUDE16_REACH, mode=Mode.PRIVATE) & part.part
    add(cut_extrude16_tool1.solids().sort_by_distance((525, 82.3, 583.6))[0], mode=Mode.SUBTRACT)
    add(cut_extrude16_tool2.solids().sort_by_distance((525, 82.3, 563.6))[0], mode=Mode.SUBTRACT)
    add(cut_extrude16_tool3.solids().sort_by_distance((525, 62.3, 583.6))[0], mode=Mode.SUBTRACT)
    add(cut_extrude16_tool4.solids().sort_by_distance((525, 62.3, 563.6))[0], mode=Mode.SUBTRACT)
    add(cut_extrude16_tool5.solids().sort_by_distance((525, 82.3, 33.5))[0], mode=Mode.SUBTRACT)
    add(cut_extrude16_tool6.solids().sort_by_distance((525, 82.3, 13.5))[0], mode=Mode.SUBTRACT)
    add(cut_extrude16_tool7.solids().sort_by_distance((525, 62.3, 13.5))[0], mode=Mode.SUBTRACT)
    add(cut_extrude16_tool8.solids().sort_by_distance((525, 62.3, 33.5))[0], mode=Mode.SUBTRACT)

    # Sketch27 → Cut-Extrude17 (cut)
    with BuildSketch(Plane.ZY.offset(-445)):
        with Locations((574.6, 62.5)):
            Rectangle(SKETCH27_W, SKETCH27_H)
    extrude(amount=-CUT_EXTRUDE17_DEPTH, mode=Mode.SUBTRACT)

    # Sketch28 → Cut-Extrude18 (cut)
    with BuildSketch(Plane.ZY.offset(-445).offset(CUT_EXTRUDE18_START)):
        with Locations((22.5, 62.5)):
            Rectangle(SKETCH28_W, SKETCH28_H)
        with Locations(Location((13.5, 62.3, 0), (0, 0, 180))):
            Circle(SKETCH28_R, mode=Mode.SUBTRACT)
        with Locations(Location((33.5, 62.3, 0), (0, 0, 180))):
            Circle(SKETCH28_R, mode=Mode.SUBTRACT)
    extrude(amount=CUT_EXTRUDE18_DEPTH, mode=Mode.SUBTRACT)

    # Sketch29 → Cut-Extrude19 (cut)
    with BuildSketch(Plane.XZ.offset(7)):
        with Locations((30, 298.55)):
            Rectangle(SKETCH29_W, SKETCH29_H)
    extrude(amount=-CUT_EXTRUDE19_DEPTH, mode=Mode.SUBTRACT)

    # Sketch33 → Cut-Extrude20 (cut, up to next)
    with BuildSketch(Plane.ZY, mode=Mode.PRIVATE) as cut_extrude20_sk1:
        with Locations((318.55, 79)):
            Circle(SKETCH33_R)
    cut_extrude20_tool1 = extrude(cut_extrude20_sk1.sketch, amount=-CUT_EXTRUDE20_REACH, mode=Mode.PRIVATE) & part.part
    # Sketch33 → Cut-Extrude20 (cut, up to next)
    with BuildSketch(Plane.ZY, mode=Mode.PRIVATE) as cut_extrude20_sk2:
        with Locations((319.356498111, 63)):
            Circle(SKETCH33_R)
    cut_extrude20_tool2 = extrude(cut_extrude20_sk2.sketch, amount=-CUT_EXTRUDE20_REACH, mode=Mode.PRIVATE) & part.part
    # Sketch33 → Cut-Extrude20 (cut, up to next)
    with BuildSketch(Plane.ZY, mode=Mode.PRIVATE) as cut_extrude20_sk3:
        with Locations((278.55, 79)):
            Circle(SKETCH33_R)
    cut_extrude20_tool3 = extrude(cut_extrude20_sk3.sketch, amount=-CUT_EXTRUDE20_REACH, mode=Mode.PRIVATE) & part.part
    # Sketch33 → Cut-Extrude20 (cut, up to next)
    with BuildSketch(Plane.ZY, mode=Mode.PRIVATE) as cut_extrude20_sk4:
        with Locations((279.356498111, 63)):
            Circle(SKETCH33_R)
    cut_extrude20_tool4 = extrude(cut_extrude20_sk4.sketch, amount=-CUT_EXTRUDE20_REACH, mode=Mode.PRIVATE) & part.part
    add(cut_extrude20_tool1.solids().sort_by_distance((0, 79, 318.55))[0], mode=Mode.SUBTRACT)
    add(cut_extrude20_tool2.solids().sort_by_distance((0, 63, 319.356498))[0], mode=Mode.SUBTRACT)
    add(cut_extrude20_tool3.solids().sort_by_distance((0, 79, 278.55))[0], mode=Mode.SUBTRACT)
    add(cut_extrude20_tool4.solids().sort_by_distance((0, 63, 279.356498))[0], mode=Mode.SUBTRACT)

    # Sketch37 → Cut-Extrude21 (cut)
    with BuildSketch(Plane(origin=(80, 0, 0), x_dir=(0, 0, -1), z_dir=(1, 0, 0))):
        with Locations((-299.68, 60)):
            Rectangle(SKETCH37_W, SKETCH37_H)
    extrude(amount=-CUT_EXTRUDE21_DEPTH, mode=Mode.SUBTRACT)

    # Sketch39 → Boss-Extrude6 (add)
    with BuildSketch(Plane.ZY):
        with Locations((5.5, 75)):
            Rectangle(SKETCH39_W, SKETCH39_H)
        with Locations((591.6, 75)):
            Rectangle(SKETCH39_W, SKETCH39_H)
    extrude(amount=BOSS_EXTRUDE6_DEPTH)

    # Sketch41 → Cut-Extrude22 (cut, through all)
    with BuildSketch(Plane(origin=(0, 0, 3), x_dir=(-1, 0, 0), z_dir=(0, 0, -1))):
        with Locations((10, 85)):
            Circle(SKETCH41_R)
        with Locations((30, 85)):
            Circle(SKETCH41_R)
        with Locations((30, 65)):
            Circle(SKETCH41_R)
        with Locations((10, 65)):
            Circle(SKETCH41_R)
    extrude(amount=-CUT_EXTRUDE22_DEPTH, mode=Mode.SUBTRACT)

    # Sketch42 → Boss-Extrude7 (add)
    with BuildSketch(Plane(origin=(80, 0, 0), x_dir=(0, 0, -1), z_dir=(1, 0, 0))):
        with Locations((-574.6, 62.5)):
            Rectangle(SKETCH42_W, SKETCH42_H)
        with Locations((-22.5, 62.5)):
            Rectangle(SKETCH42_W, SKETCH42_H)
    extrude(amount=-BOSS_EXTRUDE7_DEPTH)

    # Sketch43 → Boss-Extrude8 (add)
    with BuildSketch(Plane.ZY):
        with Locations((28.573944751, 74.190522587)):
            Rectangle(SKETCH43_W, SKETCH43_H)
        with Locations((567.8818258, 75)):
            Rectangle(SKETCH43_W_2, SKETCH43_H_2)
    extrude(amount=-BOSS_EXTRUDE8_DEPTH)

    # Sketch44 → Boss-Extrude9 (add)
    with BuildSketch(Plane(origin=(525, 0, 0), x_dir=(0, 0, -1), z_dir=(1, 0, 0))):
        with Locations((-572.281537672, 71.887491466)):
            Rectangle(SKETCH44_W, SKETCH44_H)
        with Locations((-24.748698221, 71.887491466)):
            Rectangle(SKETCH44_W_2, SKETCH44_H)
    extrude(amount=-BOSS_EXTRUDE9_DEPTH)

    # Sketch45 → Boss-Extrude10 (add)
    with BuildSketch(Plane.ZY.offset(-445)):
        with Locations((22.5, 62.5)):
            Rectangle(SKETCH45_W, SKETCH45_H)
        with Locations((574.6, 62.5)):
            Rectangle(SKETCH45_W, SKETCH45_H)
    extrude(amount=-BOSS_EXTRUDE10_DEPTH)

    # Sketch46 → Boss-Extrude11 (add)
    with BuildSketch(Plane(origin=(525, 0, 0), x_dir=(0, 0, -1), z_dir=(1, 0, 0))):
        with Locations((-591.6, 75)):
            Rectangle(SKETCH46_W, SKETCH46_H)
        with Locations((-5.5, 75)):
            Rectangle(SKETCH46_W, SKETCH46_H)
    extrude(amount=BOSS_EXTRUDE11_DEPTH)

    # Sketch47 → Cut-Extrude23 (cut, through all)
    with BuildSketch(Plane(origin=(0, 0, 3), x_dir=(-1, 0, 0), z_dir=(0, 0, -1))):
        with Locations(Location((-555, 85, 0), (0, 0, 90))):
            Circle(SKETCH47_R)
        with Locations(Location((-535, 84.658315236, 0), (0, 0, 90))):
            Circle(SKETCH47_R)
        with Locations(Location((-535, 64.658315236, 0), (0, 0, 90))):
            Circle(SKETCH47_R)
        with Locations(Location((-555, 65, 0), (0, 0, 90))):
            Circle(SKETCH47_R)
    extrude(amount=-CUT_EXTRUDE23_DEPTH, mode=Mode.SUBTRACT)

    # Fillet1
    fillet1_edges = [part.edges().sort_by_distance(p)[0] for p in [
        (0, 75, 8),
    ]]
    fillet(fillet1_edges, radius=FILLET1_R)

    # Fillet2
    fillet2_edges = [part.edges().sort_by_distance(p)[0] for p in [
        (0, 75, 589.1),
        (525, 75, 589.1),
        (525, 75, 8),
    ]]
    fillet(fillet2_edges, radius=FILLET2_R)

    # Sketch51 → Boss-Extrude12 (add)
    with BuildSketch(Plane.ZY):
        with Locations((28, 75)):
            Rectangle(SKETCH51_W, SKETCH51_H)
    extrude(amount=BOSS_EXTRUDE12_DEPTH)

    # Sketch52 → Cut-Extrude26 (cut, through all)
    with BuildSketch(Plane.ZY.offset(5)):
        with Locations((18, 85)):
            Circle(SKETCH52_R)
        with Locations((28, 85)):
            Circle(SKETCH52_R)
        with Locations((38, 85)):
            Circle(SKETCH52_R)
    extrude(amount=-CUT_EXTRUDE26_DEPTH, mode=Mode.SUBTRACT)

    # Sketch53 → Boss-Extrude13 (add, through all)
    with BuildSketch(Plane.ZY.offset(5)):
        with Locations(Location((28, 85, 0), (0, 0, 90))):
            Circle(SKETCH53_R)
    extrude(amount=-BOSS_EXTRUDE13_DEPTH)

    # Sketch54 → Cut-Extrude27 (cut)
    with BuildSketch(Plane(origin=(565, 0, 0), x_dir=(0, 0, -1), z_dir=(1, 0, 0)).offset(CUT_EXTRUDE27_START)):
        with Locations(Location((-28, 85, 0), (0, 0, 90))):
            Circle(SKETCH54_R)
    extrude(amount=CUT_EXTRUDE27_DEPTH, mode=Mode.SUBTRACT)

    # Sketch55 → Cut-Extrude28 (cut)
    with BuildSketch(Plane(origin=(0, 0, 0), x_dir=(-1, 0, 0), z_dir=(0, 0, -1))):
        with Locations((-262.5, 87.7606164)):
            Rectangle(SKETCH55_W, SKETCH55_H)
    extrude(amount=-CUT_EXTRUDE28_DEPTH, mode=Mode.SUBTRACT)

    # Sketch57 → Cut-Extrude30 (cut, through all)
    with BuildSketch(Plane(origin=(0, 0, 0), x_dir=(-1, 0, 0), z_dir=(0, 0, -1))):
        with Locations((-361.593448364, 14.646029288)):
            Rectangle(SKETCH57_W, SKETCH57_H)
    extrude(amount=-CUT_EXTRUDE30_DEPTH, mode=Mode.SUBTRACT)


with BuildPart() as body_2:
    # of the pieces the cut leaves, the one that is kept (cut_extrude30_keep)
    add(part.part.solids().sort_by_distance((0, 55, 3))[0])

    # Sketch60 → Boss-Extrude15 (add)
    with BuildSketch(Plane(origin=(0, 0, 0), x_dir=(0, 0, -1), z_dir=(1, 0, 0))):
        with Locations((17, 75)):
            Rectangle(SKETCH60_W, SKETCH60_H)
    extrude(amount=-BOSS_EXTRUDE15_DEPTH)

    # Sketch61 → Cut-Extrude31 (cut)
    with BuildSketch(Plane(origin=(0, 0, 0), x_dir=(0, 0, -1), z_dir=(1, 0, 0))):
        with Locations((7, 85)):
            Circle(SKETCH61_R)
        with Locations((27, 85)):
            Circle(SKETCH61_R)
    extrude(amount=-CUT_EXTRUDE31_DEPTH, mode=Mode.SUBTRACT)

    # Sketch62 → Cut-Extrude32 (cut)
    with BuildSketch(Plane.ZY.offset(5)):
        with Locations((28, 75)):
            Rectangle(SKETCH62_W, SKETCH62_H)
    extrude(amount=-CUT_EXTRUDE32_DEPTH, mode=Mode.SUBTRACT)

    # Sketch63 → Boss-Extrude16 (add)
    # profile 1 of 2: a face of its own
    with BuildSketch(Plane.ZY.offset(5)):
        with Locations((-7, 85)):
            Circle(SKETCH63_R)
        with Locations((-7, 85)):
            Circle(SKETCH63_R_2, mode=Mode.SUBTRACT)
    # profile 2 of 2: a face of its own
    with BuildSketch(Plane.ZY.offset(5)):
        with Locations((-27, 85)):
            Circle(SKETCH63_R_3)
        with Locations((-27, 85)):
            Circle(SKETCH63_R_2, mode=Mode.SUBTRACT)
    extrude(amount=-BOSS_EXTRUDE16_DEPTH)

    # Sketch64 → Cut-Extrude33 (cut)
    with BuildSketch(Plane.ZY.offset(5)):
        with Locations((-27, 85)):
            Circle(SKETCH64_R)
        with Locations((-7, 85)):
            Circle(SKETCH64_R)
    extrude(amount=-CUT_EXTRUDE33_DEPTH, mode=Mode.SUBTRACT)


solid = body_2.part
